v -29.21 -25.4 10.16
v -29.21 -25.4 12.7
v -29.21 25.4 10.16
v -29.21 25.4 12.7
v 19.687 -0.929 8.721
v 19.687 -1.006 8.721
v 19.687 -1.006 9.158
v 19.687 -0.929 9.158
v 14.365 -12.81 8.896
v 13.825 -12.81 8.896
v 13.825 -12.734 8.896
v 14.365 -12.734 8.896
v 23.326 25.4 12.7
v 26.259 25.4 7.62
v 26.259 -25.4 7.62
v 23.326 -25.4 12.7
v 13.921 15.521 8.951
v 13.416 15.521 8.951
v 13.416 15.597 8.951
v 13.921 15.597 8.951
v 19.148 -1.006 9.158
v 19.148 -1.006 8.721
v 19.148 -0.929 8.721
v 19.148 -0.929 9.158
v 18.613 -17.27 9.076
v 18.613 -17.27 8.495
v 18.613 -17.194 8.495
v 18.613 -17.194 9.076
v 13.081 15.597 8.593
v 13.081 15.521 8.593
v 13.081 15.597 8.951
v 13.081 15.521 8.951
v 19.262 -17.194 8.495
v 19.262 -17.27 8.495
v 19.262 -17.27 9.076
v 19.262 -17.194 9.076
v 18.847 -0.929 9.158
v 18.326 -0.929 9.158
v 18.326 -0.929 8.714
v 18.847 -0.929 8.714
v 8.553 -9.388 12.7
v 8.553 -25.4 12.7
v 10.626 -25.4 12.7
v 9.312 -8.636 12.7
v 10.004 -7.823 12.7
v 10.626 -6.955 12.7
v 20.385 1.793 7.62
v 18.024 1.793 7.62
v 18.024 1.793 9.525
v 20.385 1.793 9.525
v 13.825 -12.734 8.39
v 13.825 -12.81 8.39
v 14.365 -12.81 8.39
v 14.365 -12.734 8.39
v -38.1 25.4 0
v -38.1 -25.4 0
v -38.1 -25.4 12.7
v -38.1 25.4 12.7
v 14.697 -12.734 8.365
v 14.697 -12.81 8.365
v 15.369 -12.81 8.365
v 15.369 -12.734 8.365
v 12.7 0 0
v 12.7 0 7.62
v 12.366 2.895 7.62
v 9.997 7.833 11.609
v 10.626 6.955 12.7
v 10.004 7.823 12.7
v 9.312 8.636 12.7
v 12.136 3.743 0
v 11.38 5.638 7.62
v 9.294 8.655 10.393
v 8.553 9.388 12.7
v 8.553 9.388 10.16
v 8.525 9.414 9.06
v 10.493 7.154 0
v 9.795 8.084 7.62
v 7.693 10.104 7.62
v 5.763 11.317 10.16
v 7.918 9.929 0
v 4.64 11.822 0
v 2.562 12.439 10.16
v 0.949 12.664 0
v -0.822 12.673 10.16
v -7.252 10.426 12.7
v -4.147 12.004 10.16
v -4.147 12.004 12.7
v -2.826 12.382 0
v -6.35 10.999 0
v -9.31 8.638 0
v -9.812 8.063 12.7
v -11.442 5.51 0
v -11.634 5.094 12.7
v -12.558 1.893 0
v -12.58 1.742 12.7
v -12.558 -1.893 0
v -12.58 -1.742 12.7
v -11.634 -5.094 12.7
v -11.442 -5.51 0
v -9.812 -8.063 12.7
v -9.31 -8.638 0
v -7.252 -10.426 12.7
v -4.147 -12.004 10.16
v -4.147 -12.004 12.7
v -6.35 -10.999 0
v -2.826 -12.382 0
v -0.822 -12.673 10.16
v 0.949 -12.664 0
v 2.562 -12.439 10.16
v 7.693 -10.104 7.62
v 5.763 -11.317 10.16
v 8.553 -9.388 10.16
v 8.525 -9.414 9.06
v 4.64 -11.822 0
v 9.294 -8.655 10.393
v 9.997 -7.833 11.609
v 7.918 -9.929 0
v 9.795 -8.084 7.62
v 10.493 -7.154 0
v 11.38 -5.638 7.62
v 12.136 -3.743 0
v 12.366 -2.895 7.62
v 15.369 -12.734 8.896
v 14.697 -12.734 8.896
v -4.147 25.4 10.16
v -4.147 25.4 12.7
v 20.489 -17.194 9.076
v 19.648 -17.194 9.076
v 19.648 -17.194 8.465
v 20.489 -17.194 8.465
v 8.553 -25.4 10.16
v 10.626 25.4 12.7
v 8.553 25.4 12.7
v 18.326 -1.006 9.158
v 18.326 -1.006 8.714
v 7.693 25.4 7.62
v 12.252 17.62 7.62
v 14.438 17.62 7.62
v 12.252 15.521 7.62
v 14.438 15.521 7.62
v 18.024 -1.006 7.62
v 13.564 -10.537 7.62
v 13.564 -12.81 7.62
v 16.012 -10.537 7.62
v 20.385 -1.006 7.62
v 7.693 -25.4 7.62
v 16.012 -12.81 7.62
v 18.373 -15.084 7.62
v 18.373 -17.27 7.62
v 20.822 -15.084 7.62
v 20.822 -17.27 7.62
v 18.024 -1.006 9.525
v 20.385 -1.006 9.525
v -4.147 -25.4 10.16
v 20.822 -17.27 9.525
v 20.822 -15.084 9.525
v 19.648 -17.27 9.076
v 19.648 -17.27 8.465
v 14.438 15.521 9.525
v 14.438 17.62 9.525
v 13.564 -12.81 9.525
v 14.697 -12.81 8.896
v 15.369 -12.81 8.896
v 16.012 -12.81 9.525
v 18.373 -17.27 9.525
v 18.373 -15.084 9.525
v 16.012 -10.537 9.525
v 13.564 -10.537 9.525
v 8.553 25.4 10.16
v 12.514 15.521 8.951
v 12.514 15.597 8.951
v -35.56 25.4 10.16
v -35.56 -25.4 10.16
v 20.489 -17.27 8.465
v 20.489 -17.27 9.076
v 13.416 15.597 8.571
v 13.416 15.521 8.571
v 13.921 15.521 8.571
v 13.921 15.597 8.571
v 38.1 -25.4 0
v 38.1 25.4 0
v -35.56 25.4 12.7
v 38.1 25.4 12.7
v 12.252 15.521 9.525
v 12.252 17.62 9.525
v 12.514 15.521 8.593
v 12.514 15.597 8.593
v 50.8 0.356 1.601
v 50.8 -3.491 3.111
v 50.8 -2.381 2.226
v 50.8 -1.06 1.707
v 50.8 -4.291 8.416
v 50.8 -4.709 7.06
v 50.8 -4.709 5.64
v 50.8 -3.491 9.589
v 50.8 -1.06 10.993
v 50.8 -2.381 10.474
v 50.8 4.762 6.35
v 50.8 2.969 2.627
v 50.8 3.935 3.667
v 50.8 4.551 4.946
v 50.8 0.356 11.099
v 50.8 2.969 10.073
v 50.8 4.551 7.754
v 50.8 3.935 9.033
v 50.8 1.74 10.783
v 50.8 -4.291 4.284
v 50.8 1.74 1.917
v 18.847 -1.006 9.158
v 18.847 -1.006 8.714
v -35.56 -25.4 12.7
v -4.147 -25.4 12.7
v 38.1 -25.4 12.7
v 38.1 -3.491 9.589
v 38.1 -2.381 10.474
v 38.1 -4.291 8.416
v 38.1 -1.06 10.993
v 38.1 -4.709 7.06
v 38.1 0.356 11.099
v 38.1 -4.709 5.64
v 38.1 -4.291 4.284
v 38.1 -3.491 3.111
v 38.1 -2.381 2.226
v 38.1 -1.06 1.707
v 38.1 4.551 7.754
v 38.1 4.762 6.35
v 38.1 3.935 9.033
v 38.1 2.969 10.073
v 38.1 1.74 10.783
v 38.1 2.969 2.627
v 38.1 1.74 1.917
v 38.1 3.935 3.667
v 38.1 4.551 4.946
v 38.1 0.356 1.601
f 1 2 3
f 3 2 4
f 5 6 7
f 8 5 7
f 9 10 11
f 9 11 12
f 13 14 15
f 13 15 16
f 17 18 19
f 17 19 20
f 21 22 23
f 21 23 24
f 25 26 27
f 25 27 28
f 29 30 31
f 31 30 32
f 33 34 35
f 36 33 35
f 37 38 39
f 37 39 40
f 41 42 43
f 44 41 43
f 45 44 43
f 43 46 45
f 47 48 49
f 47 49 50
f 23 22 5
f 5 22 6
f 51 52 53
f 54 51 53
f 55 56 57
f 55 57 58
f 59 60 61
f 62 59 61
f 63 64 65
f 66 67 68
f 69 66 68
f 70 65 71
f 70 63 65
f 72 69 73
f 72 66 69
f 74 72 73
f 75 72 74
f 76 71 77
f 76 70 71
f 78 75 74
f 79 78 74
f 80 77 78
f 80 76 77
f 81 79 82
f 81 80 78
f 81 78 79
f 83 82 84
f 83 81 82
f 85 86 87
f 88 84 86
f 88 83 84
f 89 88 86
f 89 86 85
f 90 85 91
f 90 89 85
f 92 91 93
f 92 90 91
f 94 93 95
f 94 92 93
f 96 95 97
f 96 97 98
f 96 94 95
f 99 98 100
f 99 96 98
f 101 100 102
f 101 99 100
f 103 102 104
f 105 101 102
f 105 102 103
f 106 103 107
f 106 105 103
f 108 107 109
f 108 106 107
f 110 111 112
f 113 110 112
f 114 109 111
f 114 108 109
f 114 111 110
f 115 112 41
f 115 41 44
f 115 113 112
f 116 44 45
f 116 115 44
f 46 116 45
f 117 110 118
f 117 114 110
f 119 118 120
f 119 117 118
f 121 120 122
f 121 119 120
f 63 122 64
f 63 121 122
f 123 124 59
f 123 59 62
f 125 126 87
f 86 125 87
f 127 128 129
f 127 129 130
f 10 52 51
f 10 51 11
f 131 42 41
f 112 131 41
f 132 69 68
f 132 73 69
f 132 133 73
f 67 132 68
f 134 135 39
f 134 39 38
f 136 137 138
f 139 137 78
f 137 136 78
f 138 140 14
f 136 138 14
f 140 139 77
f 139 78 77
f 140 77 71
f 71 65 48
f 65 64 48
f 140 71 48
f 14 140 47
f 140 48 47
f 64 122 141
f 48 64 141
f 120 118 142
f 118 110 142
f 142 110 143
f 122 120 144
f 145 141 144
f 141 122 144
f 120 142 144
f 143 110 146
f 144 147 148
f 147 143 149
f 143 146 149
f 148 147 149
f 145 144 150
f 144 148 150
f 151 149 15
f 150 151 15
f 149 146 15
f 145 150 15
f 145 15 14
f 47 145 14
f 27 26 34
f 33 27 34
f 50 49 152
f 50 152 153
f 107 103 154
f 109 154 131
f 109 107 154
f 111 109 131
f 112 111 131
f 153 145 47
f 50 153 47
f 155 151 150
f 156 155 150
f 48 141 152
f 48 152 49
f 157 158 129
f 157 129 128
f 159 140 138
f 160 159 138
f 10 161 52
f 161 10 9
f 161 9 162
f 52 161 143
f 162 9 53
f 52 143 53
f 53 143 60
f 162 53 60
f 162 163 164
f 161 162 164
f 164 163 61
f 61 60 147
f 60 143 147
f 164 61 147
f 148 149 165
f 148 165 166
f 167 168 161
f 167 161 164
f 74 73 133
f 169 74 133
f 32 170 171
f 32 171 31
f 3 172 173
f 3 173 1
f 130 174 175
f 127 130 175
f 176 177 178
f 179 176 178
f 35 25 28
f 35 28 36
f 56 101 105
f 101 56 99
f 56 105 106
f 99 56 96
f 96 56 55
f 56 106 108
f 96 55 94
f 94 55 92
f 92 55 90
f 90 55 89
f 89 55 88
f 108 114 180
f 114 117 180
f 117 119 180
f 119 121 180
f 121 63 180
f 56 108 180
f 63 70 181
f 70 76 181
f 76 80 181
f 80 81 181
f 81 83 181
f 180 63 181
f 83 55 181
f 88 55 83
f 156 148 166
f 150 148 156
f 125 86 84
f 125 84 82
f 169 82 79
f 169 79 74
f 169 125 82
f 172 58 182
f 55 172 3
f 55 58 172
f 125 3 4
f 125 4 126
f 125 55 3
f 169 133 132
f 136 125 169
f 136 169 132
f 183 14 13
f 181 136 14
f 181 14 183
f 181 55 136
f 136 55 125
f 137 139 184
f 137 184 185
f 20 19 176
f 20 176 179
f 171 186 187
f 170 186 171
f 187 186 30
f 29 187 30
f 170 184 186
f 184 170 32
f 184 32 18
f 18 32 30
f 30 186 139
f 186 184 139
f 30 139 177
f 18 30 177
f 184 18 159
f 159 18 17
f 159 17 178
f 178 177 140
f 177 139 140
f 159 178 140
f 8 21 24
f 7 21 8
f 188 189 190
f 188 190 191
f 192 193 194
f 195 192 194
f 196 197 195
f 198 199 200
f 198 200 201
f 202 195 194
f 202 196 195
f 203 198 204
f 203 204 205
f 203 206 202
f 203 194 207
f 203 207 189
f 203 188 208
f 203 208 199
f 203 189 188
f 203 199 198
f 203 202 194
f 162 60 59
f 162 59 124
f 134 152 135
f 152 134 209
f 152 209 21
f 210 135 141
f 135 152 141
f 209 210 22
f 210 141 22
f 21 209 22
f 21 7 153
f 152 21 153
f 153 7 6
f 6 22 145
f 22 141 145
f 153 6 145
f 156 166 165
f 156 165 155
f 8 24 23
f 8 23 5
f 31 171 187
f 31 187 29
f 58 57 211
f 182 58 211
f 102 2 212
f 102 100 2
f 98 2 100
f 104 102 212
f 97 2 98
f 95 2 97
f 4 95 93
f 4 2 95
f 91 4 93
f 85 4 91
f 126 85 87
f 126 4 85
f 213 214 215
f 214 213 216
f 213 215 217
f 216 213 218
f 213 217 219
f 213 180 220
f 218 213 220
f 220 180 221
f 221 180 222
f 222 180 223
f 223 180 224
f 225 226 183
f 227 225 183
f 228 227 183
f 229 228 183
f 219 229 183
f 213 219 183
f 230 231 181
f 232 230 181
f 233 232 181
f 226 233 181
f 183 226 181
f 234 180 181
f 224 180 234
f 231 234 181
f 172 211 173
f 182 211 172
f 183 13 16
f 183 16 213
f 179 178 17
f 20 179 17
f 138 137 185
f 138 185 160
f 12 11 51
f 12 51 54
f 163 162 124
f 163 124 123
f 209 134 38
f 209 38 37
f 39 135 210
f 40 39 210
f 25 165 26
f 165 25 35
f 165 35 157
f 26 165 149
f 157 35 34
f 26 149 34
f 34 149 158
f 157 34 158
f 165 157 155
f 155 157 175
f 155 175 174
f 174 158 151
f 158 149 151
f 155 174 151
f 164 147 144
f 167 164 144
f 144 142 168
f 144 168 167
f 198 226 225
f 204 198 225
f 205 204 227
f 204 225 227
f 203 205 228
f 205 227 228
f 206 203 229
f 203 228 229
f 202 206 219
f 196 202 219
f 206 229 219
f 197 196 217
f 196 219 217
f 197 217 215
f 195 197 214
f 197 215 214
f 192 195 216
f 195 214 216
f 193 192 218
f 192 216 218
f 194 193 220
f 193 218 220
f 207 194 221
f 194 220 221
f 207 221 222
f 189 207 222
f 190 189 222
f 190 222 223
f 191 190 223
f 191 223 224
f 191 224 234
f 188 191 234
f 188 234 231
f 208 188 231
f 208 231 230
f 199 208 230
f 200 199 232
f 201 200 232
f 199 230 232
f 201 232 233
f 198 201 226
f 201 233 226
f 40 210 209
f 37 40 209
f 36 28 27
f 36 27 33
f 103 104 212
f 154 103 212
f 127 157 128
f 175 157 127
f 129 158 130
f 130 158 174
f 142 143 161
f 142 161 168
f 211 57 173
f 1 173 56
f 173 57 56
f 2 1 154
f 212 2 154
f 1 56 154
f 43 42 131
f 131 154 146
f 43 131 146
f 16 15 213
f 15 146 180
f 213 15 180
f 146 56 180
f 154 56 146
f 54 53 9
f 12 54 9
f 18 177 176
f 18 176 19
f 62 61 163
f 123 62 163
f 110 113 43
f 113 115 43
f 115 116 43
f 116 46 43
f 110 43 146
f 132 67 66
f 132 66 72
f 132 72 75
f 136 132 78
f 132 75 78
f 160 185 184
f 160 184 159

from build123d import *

# Parameters (mm, degrees)
F0_W      = 76.2
F0_H      = 50.8
F0_R      = 12.7
F1_DEPTH  = 12.7
F2_W      = 6.35
F2_H      = 50.8
F3_DEPTH  = 2.54
F5_DEPTH  = 50.801
F6_R      = 4.7625
F7_DEPTH  = 12.7
F8_W      = 2.186066
F8_H      = 2.098622
F8_W_2    = 2.360951
F8_H_2    = 2.798164
F8_W_3    = 2.448395
F8_H_3    = 2.273508
F8_H_4    = 2.186067
F9_DEPTH  = 1.905
F10_W     = 0.841629
F10_H     = 0.611811
F10_W_2   = 0.649078
F10_H_2   = 0.581
F11_DEPTH = 0.0762
F12_W     = 0.539394
F12_H     = 0.506463
F12_W_2   = 0.672908
F12_H_2   = 0.530849
F13_DEPTH = 0.0762
F14_W     = 0.521662
F14_H     = 0.444038
F14_W_2   = 0.538152
F14_H_2   = 0.436696
F15_DEPTH = 0.0762
F16_W     = 0.567031
F16_H     = 0.357919
F16_W_2   = 0.504408
F16_H_2   = 0.379607
F17_DEPTH = 0.0762


with BuildPart() as f1:
    # F0 (on Top) → F1 (new body)
    with BuildSketch(Plane.XY):
        Rectangle(F0_W, F0_H)
        Circle(F0_R, mode=Mode.SUBTRACT)
    extrude(amount=F1_DEPTH)

    # F2 (on face) → F3 (cut)
    with BuildSketch(Plane.XY.offset(12.7)):
        with Locations((-32.385, 0)):
            Rectangle(F2_W, F2_H)
        with BuildLine():
            Line((-4.147136, -12.003802), (-4.147136, -25.4))
            Line((-4.147136, -25.4), (8.552864, -25.4))
            Line((8.552864, -25.4), (8.552864, -9.388212))
            ThreePointArc((8.552864, -9.388212), (2.561823, -12.438933), (-4.147136, -12.003802))
        make_face()
        with BuildLine():
            Line((8.552864, 25.4), (-4.147136, 25.4))
            Line((-4.147136, 25.4), (-4.147136, 12.003802))
            ThreePointArc((-4.147136, 12.003802), (2.561823, 12.438933), (8.552864, 9.388212))
            Line((8.552864, 9.388212), (8.552864, 25.4))
        make_face()
    extrude(amount=-F3_DEPTH, mode=Mode.SUBTRACT)

    # F4 (on face) → F5 (cut, through all)
    with BuildSketch(Plane.XZ.offset(25.4)):
        Polygon((23.326432, 12.7), (10.626432, 12.7), (7.693492, 7.62), (26.259371, 7.62), align=None)
    extrude(amount=-F5_DEPTH, mode=Mode.SUBTRACT)

    # F6 (on face) → F7 (join)
    with BuildSketch(Plane.YZ.offset(38.1)):
        with Locations((0, 6.35)):
            Circle(F6_R)
    extrude(amount=F7_DEPTH)

    # F8 (on face) → F9 (join)
    with BuildSketch(Plane.XY.offset(7.62)):
        with Locations((13.345409, 16.570377)):
            Rectangle(F8_W, F8_H)
        with Locations((19.204065, 0.393492)):
            Rectangle(F8_W_2, F8_H_2)
        with Locations((14.788213, -11.67359)):
            Rectangle(F8_W_3, F8_H_3)
        with Locations((19.597556, -16.176885)):
            Rectangle(F8_W_3, F8_H_4)
    extrude(amount=F9_DEPTH)

    # F10 (on face) → F11 (cut)
    with BuildSketch(Plane.XZ.offset(17.269919)):
        with Locations((20.068542, 8.770566)):
            Rectangle(F10_W, F10_H)
        with Locations((18.937801, 8.785971)):
            Rectangle(F10_W_2, F10_H_2)
    extrude(amount=-F11_DEPTH, mode=Mode.SUBTRACT)

    # F12 (on face) → F13 (cut)
    with BuildSketch(Plane.XZ.offset(12.810344)):
        with Locations((14.095002, 8.64309)):
            Rectangle(F12_W, F12_H)
        with Locations((15.033044, 8.630897)):
            Rectangle(F12_W_2, F12_H_2)
    extrude(amount=-F13_DEPTH, mode=Mode.SUBTRACT)

    # F14 (on face) → F15 (cut)
    with BuildSketch(Plane.XZ.offset(1.00559)):
        with Locations((18.586445, 8.935527)):
            Rectangle(F14_W, F14_H)
        with Locations((19.417457, 8.939198)):
            Rectangle(F14_W_2, F14_H_2)
    extrude(amount=-F15_DEPTH, mode=Mode.SUBTRACT)

    # F16 (on face) → F17 (cut)
    with BuildSketch(Plane.XZ.offset(-15.521066)):
        with Locations((12.797092, 8.772087)):
            Rectangle(F16_W, F16_H)
        with Locations((13.668423, 8.761243)):
            Rectangle(F16_W_2, F16_H_2)
    extrude(amount=-F17_DEPTH, mode=Mode.SUBTRACT)


solid = f1.part
